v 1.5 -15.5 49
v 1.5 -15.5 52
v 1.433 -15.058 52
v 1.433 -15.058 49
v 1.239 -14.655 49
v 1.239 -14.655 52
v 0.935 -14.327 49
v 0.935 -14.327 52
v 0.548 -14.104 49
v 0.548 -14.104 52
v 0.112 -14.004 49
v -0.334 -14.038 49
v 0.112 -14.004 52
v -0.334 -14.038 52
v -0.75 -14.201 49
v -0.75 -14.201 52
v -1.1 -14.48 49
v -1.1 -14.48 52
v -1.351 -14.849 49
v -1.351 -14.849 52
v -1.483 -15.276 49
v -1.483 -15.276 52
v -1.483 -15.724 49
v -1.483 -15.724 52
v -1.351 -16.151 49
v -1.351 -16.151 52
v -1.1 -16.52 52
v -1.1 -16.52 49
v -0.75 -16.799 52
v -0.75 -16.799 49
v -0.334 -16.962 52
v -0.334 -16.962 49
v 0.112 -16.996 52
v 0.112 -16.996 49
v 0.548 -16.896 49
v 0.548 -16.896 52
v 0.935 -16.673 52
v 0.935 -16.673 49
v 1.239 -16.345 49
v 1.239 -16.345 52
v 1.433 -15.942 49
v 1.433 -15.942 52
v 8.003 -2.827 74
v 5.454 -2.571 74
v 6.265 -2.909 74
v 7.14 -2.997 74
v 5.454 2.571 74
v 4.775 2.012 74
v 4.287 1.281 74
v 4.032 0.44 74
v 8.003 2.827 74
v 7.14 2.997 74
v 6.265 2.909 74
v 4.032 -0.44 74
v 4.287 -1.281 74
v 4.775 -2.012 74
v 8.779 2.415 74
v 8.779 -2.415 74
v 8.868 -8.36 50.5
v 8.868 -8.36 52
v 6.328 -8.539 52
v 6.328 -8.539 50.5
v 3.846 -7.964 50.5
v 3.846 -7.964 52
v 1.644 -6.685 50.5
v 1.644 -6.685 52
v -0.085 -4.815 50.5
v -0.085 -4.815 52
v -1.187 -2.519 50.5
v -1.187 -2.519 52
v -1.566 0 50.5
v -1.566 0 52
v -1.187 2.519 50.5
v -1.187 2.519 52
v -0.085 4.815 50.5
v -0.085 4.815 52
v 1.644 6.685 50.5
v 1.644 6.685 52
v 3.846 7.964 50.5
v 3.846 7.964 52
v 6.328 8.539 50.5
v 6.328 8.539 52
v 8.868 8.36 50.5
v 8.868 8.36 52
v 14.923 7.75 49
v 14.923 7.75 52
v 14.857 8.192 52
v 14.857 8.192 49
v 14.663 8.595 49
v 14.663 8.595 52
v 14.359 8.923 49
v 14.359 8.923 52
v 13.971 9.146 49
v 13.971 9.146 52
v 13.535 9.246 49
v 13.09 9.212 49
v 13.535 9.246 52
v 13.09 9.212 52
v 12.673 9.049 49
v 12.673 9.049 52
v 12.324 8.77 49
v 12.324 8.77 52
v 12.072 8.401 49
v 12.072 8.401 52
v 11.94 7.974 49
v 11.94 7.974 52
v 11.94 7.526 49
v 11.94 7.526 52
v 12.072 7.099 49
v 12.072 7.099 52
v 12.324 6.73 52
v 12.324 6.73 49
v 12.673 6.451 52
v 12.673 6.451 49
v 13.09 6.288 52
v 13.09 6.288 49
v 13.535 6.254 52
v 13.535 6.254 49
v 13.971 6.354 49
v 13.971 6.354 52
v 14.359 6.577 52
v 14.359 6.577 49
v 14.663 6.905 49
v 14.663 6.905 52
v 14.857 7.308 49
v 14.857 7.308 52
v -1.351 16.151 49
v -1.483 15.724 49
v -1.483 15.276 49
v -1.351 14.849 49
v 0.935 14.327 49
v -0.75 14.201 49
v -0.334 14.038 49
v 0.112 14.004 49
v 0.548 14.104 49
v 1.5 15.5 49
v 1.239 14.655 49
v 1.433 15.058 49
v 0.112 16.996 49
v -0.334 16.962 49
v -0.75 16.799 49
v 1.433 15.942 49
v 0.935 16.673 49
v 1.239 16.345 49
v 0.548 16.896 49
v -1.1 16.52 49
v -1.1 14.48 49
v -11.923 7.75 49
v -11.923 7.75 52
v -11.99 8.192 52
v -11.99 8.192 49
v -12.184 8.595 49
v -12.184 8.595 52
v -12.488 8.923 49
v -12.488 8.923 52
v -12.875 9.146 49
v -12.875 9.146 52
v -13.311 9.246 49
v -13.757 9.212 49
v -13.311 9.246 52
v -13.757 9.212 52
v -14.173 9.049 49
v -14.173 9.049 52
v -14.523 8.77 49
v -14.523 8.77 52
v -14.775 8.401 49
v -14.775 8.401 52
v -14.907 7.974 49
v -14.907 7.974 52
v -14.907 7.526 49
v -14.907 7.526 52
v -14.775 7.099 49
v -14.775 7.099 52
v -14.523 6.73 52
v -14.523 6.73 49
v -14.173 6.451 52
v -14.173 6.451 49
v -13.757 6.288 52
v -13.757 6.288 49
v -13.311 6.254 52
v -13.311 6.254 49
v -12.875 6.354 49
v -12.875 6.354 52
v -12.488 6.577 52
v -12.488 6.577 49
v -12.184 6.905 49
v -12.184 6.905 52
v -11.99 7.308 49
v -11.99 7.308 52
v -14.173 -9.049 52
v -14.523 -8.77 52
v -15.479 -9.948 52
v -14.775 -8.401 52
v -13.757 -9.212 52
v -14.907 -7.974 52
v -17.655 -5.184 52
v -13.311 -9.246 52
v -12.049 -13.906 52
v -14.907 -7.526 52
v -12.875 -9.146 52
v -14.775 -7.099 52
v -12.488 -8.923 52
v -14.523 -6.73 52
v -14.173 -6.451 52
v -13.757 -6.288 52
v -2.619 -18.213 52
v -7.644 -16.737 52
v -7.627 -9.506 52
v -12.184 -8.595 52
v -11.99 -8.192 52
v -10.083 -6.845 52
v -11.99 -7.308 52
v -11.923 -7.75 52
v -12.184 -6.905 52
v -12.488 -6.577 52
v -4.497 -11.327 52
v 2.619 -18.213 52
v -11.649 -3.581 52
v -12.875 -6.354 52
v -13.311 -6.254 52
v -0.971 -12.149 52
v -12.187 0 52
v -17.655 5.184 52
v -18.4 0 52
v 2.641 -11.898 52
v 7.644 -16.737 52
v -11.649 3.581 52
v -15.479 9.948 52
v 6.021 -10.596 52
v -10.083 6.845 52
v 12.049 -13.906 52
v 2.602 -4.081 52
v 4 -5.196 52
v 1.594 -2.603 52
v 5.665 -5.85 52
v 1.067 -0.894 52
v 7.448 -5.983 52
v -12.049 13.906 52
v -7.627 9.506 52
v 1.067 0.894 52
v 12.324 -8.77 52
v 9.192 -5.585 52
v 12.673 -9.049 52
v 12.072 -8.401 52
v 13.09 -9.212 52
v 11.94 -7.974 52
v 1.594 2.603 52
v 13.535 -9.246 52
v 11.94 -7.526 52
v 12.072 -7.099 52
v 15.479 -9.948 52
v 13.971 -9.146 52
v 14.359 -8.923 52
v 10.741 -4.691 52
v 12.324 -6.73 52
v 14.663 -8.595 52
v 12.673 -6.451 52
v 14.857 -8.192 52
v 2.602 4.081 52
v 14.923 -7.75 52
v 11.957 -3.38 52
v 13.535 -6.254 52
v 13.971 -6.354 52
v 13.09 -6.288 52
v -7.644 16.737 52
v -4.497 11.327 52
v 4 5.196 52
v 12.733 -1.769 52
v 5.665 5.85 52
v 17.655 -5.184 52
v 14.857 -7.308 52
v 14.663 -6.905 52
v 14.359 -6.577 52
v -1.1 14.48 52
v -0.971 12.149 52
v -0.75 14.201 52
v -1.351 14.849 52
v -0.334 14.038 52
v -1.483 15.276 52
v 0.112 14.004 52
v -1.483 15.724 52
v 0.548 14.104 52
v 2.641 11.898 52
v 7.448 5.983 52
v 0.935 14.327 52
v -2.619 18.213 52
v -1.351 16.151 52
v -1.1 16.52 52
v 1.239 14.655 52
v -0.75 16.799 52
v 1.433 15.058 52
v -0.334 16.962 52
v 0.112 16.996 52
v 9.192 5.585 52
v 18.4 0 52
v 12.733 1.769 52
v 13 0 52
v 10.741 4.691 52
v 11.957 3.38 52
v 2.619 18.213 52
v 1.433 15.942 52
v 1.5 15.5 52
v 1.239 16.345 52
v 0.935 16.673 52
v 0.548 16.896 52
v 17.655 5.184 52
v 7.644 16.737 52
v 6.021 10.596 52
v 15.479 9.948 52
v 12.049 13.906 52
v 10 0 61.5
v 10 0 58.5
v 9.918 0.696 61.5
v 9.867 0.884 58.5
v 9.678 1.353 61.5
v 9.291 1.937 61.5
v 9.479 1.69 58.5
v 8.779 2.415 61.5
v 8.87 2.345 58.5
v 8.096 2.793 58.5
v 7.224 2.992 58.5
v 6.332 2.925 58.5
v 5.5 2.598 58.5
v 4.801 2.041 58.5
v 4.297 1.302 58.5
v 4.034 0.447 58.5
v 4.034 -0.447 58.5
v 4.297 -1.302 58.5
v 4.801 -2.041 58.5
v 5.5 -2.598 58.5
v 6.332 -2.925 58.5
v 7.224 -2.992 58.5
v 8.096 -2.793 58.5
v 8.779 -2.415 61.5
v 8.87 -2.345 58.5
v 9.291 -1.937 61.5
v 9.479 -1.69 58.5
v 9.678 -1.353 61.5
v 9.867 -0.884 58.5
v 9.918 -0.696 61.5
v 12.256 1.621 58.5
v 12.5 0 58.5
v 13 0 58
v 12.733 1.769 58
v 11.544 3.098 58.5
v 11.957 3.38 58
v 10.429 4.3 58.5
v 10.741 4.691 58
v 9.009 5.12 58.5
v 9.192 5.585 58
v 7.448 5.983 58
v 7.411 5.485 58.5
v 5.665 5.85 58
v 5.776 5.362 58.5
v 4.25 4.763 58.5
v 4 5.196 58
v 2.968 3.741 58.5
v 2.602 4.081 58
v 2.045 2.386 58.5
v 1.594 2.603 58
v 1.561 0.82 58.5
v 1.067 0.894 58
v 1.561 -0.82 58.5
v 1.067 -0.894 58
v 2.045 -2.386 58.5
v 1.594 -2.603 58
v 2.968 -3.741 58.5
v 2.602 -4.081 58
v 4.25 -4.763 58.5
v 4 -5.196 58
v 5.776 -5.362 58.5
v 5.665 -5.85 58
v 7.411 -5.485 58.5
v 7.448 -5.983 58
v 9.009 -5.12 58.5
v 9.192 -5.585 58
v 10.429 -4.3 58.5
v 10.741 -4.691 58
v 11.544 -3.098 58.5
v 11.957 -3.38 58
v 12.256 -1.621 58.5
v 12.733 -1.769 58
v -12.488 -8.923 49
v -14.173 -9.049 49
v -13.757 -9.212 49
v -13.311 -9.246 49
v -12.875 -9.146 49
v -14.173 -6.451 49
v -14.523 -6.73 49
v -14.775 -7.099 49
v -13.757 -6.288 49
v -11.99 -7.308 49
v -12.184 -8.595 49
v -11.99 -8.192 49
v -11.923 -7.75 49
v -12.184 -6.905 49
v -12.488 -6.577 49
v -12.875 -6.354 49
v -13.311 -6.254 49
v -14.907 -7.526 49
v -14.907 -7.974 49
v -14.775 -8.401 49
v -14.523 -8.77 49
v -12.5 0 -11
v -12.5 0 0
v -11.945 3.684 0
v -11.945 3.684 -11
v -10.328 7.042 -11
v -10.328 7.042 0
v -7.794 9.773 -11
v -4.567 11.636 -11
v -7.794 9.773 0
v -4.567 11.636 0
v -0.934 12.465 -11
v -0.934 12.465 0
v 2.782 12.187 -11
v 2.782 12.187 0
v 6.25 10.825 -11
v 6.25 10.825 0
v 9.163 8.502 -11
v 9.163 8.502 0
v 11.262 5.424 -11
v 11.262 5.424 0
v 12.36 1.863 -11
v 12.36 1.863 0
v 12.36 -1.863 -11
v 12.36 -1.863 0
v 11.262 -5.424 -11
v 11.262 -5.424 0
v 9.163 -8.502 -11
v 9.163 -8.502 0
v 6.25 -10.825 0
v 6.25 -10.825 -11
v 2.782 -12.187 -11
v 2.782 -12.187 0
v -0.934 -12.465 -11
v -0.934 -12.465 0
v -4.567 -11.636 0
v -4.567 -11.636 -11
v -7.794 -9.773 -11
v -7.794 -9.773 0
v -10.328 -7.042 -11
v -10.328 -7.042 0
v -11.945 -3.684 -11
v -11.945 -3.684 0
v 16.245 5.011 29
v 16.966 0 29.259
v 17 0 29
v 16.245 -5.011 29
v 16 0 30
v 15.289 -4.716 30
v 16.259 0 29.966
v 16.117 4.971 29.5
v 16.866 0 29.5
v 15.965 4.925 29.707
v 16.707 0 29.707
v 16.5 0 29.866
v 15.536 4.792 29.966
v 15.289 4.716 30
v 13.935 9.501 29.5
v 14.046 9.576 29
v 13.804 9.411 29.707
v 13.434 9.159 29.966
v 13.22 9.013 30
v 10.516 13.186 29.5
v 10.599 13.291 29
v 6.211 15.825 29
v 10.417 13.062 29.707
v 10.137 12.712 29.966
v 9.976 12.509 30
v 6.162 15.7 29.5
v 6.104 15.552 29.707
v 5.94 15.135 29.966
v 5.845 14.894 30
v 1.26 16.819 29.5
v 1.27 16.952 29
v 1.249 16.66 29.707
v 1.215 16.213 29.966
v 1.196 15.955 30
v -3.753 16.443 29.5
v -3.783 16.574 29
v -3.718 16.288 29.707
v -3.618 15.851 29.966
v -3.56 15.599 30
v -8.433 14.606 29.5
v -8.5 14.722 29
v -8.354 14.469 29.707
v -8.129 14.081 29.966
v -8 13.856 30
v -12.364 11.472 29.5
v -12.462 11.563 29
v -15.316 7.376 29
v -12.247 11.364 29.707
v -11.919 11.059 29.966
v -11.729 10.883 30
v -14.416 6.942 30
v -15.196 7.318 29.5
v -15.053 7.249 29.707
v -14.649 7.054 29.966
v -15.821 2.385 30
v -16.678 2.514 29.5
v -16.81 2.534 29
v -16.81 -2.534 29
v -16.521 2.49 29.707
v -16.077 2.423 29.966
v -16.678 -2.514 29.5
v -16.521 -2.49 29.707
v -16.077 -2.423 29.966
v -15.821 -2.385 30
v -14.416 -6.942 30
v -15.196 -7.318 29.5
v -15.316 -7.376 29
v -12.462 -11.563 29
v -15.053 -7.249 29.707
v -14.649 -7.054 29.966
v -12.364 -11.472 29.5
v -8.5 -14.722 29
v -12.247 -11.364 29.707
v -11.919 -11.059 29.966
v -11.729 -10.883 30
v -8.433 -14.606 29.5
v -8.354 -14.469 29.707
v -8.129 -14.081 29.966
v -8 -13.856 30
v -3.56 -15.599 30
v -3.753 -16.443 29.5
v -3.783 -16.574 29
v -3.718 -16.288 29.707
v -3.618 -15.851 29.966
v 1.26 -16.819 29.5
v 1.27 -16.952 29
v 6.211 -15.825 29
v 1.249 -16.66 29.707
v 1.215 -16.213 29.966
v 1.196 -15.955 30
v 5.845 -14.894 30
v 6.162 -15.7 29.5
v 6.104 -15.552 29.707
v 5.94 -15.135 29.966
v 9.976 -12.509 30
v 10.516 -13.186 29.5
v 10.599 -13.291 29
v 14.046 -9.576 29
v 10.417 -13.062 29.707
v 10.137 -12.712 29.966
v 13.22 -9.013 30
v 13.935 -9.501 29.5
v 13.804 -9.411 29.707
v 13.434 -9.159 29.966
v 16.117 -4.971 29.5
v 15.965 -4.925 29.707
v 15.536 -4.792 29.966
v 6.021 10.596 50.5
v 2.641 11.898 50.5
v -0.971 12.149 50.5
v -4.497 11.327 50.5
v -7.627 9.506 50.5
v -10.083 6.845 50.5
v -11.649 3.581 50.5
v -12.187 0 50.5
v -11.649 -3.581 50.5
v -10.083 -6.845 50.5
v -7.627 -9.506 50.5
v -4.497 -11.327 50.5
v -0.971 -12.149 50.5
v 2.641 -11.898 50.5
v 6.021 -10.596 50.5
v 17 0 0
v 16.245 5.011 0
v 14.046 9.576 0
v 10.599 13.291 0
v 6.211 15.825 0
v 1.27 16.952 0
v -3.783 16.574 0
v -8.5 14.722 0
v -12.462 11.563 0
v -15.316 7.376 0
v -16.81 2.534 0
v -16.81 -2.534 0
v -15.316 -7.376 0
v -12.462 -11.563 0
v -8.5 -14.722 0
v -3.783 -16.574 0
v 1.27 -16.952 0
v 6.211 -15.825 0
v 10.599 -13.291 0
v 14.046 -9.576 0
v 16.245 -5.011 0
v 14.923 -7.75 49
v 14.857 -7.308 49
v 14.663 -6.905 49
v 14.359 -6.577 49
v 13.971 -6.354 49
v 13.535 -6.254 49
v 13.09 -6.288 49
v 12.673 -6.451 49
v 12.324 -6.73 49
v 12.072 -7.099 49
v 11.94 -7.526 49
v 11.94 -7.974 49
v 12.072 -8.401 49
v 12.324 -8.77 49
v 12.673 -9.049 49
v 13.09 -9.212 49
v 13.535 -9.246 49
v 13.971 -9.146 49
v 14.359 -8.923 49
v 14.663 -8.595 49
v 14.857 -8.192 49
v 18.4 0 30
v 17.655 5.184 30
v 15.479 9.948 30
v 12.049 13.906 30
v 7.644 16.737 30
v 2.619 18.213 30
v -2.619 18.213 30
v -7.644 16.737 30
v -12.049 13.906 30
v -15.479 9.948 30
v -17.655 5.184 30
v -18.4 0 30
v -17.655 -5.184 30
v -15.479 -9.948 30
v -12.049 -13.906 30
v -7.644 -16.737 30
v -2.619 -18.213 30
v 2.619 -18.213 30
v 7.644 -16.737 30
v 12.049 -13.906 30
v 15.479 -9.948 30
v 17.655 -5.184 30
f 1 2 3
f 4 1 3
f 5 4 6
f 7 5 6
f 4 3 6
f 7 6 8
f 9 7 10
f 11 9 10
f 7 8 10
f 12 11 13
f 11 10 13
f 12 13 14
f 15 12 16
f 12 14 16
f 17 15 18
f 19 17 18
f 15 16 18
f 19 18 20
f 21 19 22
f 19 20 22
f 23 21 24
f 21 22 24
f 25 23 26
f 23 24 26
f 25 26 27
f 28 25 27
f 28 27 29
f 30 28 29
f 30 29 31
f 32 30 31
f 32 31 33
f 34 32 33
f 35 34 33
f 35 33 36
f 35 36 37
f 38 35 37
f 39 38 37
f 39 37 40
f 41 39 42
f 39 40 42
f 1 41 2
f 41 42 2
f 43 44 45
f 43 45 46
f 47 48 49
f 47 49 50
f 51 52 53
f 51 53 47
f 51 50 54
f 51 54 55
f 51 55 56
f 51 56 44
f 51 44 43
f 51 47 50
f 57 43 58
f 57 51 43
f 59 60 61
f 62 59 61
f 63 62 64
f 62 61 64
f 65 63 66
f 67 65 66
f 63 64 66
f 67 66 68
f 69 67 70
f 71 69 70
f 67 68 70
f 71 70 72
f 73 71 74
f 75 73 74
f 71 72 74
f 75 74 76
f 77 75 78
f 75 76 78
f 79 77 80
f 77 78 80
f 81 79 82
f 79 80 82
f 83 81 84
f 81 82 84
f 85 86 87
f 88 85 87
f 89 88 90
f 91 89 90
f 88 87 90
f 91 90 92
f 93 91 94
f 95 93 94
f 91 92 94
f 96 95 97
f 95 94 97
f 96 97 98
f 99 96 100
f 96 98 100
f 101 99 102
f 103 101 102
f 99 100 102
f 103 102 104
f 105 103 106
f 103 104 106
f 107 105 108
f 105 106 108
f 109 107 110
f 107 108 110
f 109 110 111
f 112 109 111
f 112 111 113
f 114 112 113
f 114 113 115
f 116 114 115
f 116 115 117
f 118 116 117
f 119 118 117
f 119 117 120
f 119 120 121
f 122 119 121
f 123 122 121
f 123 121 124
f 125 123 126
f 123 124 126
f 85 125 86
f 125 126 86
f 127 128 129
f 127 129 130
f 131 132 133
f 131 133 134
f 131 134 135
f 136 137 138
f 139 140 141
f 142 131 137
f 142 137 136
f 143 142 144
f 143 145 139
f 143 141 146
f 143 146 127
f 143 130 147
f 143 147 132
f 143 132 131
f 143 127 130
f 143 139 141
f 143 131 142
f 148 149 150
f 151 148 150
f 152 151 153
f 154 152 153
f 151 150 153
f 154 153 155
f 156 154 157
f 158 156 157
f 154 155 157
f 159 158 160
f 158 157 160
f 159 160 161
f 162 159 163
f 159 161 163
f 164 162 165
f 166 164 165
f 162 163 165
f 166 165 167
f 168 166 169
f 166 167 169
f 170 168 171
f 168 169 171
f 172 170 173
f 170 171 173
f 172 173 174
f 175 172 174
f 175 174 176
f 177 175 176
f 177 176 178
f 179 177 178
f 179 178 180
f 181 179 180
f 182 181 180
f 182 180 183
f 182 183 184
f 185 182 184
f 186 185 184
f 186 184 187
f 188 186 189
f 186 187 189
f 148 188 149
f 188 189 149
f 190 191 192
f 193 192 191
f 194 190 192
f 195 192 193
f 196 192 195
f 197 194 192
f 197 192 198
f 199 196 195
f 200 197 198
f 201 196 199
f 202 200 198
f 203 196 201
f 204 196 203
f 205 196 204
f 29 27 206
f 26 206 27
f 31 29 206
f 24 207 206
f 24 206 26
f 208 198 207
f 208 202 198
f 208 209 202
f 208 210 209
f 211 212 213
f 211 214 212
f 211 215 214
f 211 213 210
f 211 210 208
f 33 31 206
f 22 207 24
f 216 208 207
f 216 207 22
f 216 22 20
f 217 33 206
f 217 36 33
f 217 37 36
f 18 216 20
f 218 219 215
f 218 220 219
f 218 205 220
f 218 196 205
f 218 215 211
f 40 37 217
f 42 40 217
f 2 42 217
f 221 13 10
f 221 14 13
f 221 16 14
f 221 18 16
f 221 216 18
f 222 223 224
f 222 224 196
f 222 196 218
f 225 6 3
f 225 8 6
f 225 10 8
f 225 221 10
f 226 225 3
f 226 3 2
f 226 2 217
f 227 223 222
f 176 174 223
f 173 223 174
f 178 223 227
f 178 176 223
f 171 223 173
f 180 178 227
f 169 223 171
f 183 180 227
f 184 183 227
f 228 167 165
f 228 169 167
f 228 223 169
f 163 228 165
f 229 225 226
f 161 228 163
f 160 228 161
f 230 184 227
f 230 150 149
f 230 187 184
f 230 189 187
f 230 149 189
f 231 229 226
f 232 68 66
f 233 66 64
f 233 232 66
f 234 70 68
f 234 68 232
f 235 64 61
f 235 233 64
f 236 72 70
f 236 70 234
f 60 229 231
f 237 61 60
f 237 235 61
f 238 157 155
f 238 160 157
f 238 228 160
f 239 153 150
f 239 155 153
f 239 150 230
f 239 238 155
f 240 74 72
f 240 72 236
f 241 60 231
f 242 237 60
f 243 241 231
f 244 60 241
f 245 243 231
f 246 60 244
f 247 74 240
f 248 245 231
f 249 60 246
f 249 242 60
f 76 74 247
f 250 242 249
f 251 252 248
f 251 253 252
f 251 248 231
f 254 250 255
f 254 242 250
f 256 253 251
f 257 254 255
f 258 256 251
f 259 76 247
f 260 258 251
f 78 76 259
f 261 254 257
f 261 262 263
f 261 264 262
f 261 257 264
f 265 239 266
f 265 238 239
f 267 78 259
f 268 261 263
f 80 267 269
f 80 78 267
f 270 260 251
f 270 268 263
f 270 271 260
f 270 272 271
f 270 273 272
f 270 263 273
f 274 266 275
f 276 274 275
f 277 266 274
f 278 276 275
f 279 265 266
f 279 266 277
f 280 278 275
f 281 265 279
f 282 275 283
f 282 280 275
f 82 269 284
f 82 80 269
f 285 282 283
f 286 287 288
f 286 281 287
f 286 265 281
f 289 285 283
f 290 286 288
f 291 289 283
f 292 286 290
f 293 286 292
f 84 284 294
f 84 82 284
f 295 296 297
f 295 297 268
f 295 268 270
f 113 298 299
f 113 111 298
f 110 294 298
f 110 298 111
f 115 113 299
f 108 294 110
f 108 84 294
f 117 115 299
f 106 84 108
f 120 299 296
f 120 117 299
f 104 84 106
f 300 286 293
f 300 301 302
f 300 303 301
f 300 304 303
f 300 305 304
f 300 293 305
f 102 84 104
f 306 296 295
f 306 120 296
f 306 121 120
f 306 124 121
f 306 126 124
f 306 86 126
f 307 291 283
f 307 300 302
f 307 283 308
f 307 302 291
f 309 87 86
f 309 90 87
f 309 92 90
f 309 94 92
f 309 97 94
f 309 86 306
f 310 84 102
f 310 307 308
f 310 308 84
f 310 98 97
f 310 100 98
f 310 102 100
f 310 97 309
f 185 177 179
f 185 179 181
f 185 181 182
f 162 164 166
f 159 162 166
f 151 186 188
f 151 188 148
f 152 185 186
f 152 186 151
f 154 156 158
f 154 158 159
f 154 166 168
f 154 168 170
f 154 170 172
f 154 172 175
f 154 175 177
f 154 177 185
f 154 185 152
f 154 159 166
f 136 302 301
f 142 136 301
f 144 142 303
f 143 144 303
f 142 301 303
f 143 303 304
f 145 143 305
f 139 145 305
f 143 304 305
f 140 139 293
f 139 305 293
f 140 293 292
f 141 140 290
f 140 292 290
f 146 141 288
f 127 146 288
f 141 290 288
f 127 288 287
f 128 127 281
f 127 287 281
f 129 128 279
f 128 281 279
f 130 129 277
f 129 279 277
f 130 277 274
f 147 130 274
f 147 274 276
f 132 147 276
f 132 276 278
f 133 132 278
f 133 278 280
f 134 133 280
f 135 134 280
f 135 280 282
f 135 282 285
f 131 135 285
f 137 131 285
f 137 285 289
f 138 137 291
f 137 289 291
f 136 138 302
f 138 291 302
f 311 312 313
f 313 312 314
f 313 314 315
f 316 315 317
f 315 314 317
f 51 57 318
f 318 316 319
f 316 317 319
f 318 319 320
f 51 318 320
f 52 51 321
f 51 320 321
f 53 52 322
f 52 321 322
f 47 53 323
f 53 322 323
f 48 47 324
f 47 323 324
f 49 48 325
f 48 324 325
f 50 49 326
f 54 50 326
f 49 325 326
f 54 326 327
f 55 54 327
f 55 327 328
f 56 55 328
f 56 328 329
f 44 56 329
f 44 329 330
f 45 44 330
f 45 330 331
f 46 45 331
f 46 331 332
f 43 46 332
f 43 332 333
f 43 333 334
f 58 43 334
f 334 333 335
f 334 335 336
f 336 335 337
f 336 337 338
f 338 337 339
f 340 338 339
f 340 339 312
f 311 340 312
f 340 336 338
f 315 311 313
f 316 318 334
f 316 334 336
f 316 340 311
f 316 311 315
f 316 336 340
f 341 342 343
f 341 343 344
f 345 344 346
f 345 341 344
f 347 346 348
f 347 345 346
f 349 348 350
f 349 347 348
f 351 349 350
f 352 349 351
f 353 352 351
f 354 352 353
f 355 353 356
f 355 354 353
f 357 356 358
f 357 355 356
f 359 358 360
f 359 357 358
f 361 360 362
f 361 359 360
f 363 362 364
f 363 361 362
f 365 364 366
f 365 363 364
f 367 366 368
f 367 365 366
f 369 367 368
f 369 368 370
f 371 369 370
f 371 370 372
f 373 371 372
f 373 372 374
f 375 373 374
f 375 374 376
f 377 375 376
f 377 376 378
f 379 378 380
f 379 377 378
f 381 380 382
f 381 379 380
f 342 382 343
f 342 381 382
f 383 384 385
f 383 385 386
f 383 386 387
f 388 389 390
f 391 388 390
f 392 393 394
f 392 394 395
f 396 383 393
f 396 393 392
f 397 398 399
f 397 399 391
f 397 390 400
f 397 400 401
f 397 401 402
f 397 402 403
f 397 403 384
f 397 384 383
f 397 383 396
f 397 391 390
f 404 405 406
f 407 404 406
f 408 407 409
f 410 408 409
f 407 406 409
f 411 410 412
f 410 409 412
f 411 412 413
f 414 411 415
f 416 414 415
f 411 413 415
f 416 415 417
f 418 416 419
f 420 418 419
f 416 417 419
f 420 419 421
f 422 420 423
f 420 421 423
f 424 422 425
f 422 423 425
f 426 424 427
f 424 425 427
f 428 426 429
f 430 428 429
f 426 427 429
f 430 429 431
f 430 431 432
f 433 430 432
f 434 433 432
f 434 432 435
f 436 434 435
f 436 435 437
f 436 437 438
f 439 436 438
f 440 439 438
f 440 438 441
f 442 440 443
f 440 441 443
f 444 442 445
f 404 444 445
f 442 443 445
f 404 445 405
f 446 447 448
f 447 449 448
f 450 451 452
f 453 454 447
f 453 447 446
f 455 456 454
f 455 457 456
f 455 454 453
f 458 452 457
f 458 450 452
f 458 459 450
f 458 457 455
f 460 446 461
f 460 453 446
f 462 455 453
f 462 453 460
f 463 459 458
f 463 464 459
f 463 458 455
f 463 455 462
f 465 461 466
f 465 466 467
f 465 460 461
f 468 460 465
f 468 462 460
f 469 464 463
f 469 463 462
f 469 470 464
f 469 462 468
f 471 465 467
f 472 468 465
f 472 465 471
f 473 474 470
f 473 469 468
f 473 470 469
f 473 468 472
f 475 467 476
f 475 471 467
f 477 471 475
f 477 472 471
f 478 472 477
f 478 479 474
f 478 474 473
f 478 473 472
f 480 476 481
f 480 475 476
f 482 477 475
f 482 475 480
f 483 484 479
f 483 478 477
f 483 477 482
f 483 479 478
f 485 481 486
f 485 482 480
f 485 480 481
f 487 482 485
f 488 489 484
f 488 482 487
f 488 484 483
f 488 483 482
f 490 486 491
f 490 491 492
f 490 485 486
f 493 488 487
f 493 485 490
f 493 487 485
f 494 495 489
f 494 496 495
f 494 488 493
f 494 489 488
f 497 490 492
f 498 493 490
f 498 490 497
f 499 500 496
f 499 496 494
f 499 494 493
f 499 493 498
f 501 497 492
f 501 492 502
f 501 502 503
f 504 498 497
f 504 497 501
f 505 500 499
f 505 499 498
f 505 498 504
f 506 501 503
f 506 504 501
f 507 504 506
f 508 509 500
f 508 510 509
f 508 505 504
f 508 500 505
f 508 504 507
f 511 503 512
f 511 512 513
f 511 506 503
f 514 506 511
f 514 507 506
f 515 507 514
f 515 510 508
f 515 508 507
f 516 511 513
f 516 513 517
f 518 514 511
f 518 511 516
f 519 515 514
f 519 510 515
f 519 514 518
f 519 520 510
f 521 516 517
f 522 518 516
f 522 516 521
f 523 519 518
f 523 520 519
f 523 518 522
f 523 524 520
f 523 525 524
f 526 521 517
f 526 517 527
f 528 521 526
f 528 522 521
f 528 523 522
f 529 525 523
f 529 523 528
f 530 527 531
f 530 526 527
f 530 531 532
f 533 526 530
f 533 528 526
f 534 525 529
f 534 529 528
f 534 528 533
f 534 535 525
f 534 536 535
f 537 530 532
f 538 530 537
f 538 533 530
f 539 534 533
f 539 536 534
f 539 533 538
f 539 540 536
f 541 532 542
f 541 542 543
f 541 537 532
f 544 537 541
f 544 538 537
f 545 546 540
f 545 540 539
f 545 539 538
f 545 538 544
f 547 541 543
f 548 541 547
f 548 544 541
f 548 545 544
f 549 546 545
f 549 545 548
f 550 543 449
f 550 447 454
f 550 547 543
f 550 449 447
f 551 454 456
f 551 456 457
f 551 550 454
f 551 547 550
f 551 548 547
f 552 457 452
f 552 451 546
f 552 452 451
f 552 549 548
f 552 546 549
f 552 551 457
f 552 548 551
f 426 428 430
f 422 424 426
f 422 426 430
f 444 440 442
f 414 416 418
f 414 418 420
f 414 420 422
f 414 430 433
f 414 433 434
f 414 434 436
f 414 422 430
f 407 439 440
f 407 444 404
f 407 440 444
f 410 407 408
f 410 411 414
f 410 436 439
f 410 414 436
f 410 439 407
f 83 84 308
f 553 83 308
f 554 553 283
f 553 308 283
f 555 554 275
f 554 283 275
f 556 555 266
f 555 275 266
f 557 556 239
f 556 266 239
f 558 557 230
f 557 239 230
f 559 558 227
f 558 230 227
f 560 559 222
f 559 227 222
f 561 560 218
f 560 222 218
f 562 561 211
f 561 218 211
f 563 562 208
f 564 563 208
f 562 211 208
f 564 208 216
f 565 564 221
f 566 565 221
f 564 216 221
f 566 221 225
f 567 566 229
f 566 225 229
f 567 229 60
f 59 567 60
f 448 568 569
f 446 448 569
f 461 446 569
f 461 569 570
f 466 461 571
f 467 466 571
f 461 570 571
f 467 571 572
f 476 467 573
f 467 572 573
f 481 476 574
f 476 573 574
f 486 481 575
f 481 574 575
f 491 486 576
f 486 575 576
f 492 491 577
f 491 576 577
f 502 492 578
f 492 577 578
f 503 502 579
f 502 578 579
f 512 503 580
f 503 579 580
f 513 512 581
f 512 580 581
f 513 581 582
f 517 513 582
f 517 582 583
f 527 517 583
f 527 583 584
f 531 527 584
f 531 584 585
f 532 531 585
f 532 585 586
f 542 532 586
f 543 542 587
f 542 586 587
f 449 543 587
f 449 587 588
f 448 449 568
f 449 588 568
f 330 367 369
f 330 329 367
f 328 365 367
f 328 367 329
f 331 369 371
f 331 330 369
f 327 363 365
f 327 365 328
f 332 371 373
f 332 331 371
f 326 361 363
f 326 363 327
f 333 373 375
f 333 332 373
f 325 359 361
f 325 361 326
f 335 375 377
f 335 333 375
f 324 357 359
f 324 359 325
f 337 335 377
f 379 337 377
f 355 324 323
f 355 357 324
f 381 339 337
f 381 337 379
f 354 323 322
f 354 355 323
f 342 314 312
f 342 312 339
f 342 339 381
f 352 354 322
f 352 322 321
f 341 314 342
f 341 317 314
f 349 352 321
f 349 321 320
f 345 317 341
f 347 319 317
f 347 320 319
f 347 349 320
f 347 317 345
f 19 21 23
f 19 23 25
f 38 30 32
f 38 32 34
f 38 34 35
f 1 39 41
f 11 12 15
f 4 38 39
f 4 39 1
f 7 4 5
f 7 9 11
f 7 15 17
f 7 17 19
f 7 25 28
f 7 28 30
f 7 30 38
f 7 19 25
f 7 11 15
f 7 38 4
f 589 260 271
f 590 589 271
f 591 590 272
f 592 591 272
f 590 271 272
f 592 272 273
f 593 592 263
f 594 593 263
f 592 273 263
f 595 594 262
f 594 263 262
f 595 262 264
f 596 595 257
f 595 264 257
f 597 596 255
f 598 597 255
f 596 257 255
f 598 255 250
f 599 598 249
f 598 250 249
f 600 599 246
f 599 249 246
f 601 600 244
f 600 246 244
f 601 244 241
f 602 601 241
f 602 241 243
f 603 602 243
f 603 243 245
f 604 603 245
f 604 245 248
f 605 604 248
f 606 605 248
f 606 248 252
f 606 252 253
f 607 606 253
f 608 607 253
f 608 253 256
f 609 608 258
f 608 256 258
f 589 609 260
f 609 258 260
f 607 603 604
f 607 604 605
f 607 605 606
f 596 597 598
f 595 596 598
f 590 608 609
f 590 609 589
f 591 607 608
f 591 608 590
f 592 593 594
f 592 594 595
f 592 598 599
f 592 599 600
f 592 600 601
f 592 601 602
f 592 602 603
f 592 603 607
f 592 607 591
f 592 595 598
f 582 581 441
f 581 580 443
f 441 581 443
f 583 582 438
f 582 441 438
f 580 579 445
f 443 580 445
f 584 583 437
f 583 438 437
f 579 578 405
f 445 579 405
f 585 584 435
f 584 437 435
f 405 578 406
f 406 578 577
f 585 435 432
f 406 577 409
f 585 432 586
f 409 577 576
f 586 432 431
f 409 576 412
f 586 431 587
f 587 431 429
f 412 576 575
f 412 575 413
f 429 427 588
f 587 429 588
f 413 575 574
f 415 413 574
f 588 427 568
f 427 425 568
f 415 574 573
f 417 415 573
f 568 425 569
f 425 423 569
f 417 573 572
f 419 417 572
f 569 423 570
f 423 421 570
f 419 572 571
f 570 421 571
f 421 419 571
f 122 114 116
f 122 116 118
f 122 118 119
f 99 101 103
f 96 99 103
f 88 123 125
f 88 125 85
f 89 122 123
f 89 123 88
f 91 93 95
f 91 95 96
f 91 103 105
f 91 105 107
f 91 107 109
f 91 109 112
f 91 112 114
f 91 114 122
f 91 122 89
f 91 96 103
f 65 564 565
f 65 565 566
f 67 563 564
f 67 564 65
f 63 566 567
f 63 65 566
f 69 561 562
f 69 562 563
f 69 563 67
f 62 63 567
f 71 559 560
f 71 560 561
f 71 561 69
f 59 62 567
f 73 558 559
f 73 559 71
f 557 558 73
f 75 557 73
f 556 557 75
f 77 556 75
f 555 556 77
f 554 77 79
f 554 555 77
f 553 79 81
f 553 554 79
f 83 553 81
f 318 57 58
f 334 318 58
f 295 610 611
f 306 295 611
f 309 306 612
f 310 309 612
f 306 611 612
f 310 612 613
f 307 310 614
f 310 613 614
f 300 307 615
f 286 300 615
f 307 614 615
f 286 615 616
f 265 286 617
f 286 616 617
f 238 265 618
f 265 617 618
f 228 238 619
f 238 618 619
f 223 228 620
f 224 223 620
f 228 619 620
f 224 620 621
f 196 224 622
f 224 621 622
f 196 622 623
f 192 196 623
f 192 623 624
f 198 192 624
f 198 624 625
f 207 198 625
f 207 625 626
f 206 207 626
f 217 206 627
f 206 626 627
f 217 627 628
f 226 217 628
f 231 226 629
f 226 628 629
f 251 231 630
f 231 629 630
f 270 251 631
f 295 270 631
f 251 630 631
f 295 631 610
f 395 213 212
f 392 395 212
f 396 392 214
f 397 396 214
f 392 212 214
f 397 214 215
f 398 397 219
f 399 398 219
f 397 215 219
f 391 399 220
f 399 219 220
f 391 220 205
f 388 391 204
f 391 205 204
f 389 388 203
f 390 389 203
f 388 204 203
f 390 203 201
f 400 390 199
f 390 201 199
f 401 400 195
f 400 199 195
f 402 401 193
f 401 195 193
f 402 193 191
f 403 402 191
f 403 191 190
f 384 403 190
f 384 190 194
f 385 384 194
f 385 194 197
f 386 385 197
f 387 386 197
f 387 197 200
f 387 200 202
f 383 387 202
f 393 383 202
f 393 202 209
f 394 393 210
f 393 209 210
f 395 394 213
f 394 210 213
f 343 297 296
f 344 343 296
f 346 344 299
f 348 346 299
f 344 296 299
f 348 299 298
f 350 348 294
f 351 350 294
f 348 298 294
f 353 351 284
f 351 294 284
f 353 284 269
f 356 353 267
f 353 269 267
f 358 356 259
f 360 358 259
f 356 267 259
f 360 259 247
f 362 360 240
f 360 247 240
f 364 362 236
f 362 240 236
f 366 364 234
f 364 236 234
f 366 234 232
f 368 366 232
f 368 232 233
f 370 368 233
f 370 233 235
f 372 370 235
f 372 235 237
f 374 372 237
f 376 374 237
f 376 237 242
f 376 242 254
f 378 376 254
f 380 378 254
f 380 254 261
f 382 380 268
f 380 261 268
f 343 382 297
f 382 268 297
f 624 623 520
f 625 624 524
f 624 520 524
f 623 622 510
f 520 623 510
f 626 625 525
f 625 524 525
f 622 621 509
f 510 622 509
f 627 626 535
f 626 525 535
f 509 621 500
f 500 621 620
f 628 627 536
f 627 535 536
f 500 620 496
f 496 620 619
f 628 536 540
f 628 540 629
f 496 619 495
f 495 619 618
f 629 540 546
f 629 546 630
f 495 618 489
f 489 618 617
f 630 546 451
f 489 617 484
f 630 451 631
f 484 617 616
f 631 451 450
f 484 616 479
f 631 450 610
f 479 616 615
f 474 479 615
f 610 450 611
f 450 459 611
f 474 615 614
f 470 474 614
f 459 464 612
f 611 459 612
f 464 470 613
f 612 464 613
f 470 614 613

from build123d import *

# Parameters (mm, degrees)
SKETCH1_R           = 17
BOSS_EXTRUDE1_DEPTH = 30
FILLET1_R           = 1
SKETCH2_R           = 18.4
BOSS_EXTRUDE2_DEPTH = 22
SKETCH3_R           = 1.5
CUT_EXTRUDE1_DEPTH  = 3
SKETCH4_R           = 6
BOSS_EXTRUDE3_DEPTH = 6.5
CHAMFER1_SIZE       = 0.5
SKETCH5_R           = 3
BOSS_EXTRUDE4_DEPTH = 15.5
CUT_EXTRUDE3_DEPTH  = 1.5
SKETCH7_R           = 12.5
BOSS_EXTRUDE5_DEPTH = 11
CUT_EXTRUDE4_DEPTH  = 12.5


with BuildPart() as part:
    # Sketch1 → Boss-Extrude1 (new body)
    with BuildSketch(Plane.XY):
        Circle(SKETCH1_R)
    extrude(amount=BOSS_EXTRUDE1_DEPTH)

    # Fillet1
    fillet1_edges = [part.edges().sort_by_distance(p)[0] for p in [
        (-17, 0, 30),
    ]]
    fillet(fillet1_edges, radius=FILLET1_R)

    # Sketch2 → Boss-Extrude2 (add)
    with BuildSketch(Plane.XY.offset(30)):
        Circle(SKETCH2_R)
    extrude(amount=BOSS_EXTRUDE2_DEPTH)

    # Sketch3 → Cut-Extrude1 (cut)
    with BuildSketch(Plane.XY.offset(52)):
        with Locations((0, 15.5)):
            Circle(SKETCH3_R)
        with Locations((13.423393759, 7.75)):
            Circle(SKETCH3_R)
        with Locations((13.423393759, -7.75)):
            Circle(SKETCH3_R)
        with Locations((0, -15.5)):
            Circle(SKETCH3_R)
        with Locations((-13.423393759, -7.75)):
            Circle(SKETCH3_R)
        with Locations((-13.423393759, 7.75)):
            Circle(SKETCH3_R)
    extrude(amount=-CUT_EXTRUDE1_DEPTH, mode=Mode.SUBTRACT)

    # Sketch4 → Boss-Extrude3 (add)
    with BuildSketch(Plane.XY.offset(52)):
        with Locations((7, 0)):
            Circle(SKETCH4_R)
    extrude(amount=BOSS_EXTRUDE3_DEPTH)

    # Chamfer1
    chamfer1_edges = [part.edges().sort_by_distance(p)[0] for p in [
        (1, 0, 58.5),
    ]]
    chamfer(chamfer1_edges, length=CHAMFER1_SIZE)

    # Sketch5 → Boss-Extrude4 (add)
    with BuildSketch(Plane.XY.offset(58.5)):
        with Locations((7, 0)):
            Circle(SKETCH5_R)
    extrude(amount=BOSS_EXTRUDE4_DEPTH)

    # Sketch6 → Cut-Extrude3 (cut)
    with BuildSketch(Plane.XY.offset(52)):
        with BuildLine():
            ThreePointArc((8.868134735, -8.359715213), (-1.565907181, 0), (8.868134735, 8.359715213))
            ThreePointArc((8.868134735, 8.359715213), (-12.187233161, 0), (8.868134735, -8.359715213))
        make_face()
    extrude(amount=-CUT_EXTRUDE3_DEPTH, mode=Mode.SUBTRACT)

    # Sketch7 → Boss-Extrude5 (add)
    with BuildSketch(Plane(origin=(0, 0, 0), x_dir=(-1, 0, 0), z_dir=(0, 0, -1))):
        Circle(SKETCH7_R)
    extrude(amount=BOSS_EXTRUDE5_DEPTH)

    # Sketch8 → Cut-Extrude4 (cut)
    with BuildSketch(Plane.XY.offset(74)):
        with BuildLine():
            Line((8.779351905, 2.415348174), (8.779351905, -2.415348174))
            ThreePointArc((8.779351905, -2.415348174), (10, 0), (8.779351905, 2.415348174))
        make_face()
    extrude(amount=-CUT_EXTRUDE4_DEPTH, mode=Mode.SUBTRACT)


solid = part.part
